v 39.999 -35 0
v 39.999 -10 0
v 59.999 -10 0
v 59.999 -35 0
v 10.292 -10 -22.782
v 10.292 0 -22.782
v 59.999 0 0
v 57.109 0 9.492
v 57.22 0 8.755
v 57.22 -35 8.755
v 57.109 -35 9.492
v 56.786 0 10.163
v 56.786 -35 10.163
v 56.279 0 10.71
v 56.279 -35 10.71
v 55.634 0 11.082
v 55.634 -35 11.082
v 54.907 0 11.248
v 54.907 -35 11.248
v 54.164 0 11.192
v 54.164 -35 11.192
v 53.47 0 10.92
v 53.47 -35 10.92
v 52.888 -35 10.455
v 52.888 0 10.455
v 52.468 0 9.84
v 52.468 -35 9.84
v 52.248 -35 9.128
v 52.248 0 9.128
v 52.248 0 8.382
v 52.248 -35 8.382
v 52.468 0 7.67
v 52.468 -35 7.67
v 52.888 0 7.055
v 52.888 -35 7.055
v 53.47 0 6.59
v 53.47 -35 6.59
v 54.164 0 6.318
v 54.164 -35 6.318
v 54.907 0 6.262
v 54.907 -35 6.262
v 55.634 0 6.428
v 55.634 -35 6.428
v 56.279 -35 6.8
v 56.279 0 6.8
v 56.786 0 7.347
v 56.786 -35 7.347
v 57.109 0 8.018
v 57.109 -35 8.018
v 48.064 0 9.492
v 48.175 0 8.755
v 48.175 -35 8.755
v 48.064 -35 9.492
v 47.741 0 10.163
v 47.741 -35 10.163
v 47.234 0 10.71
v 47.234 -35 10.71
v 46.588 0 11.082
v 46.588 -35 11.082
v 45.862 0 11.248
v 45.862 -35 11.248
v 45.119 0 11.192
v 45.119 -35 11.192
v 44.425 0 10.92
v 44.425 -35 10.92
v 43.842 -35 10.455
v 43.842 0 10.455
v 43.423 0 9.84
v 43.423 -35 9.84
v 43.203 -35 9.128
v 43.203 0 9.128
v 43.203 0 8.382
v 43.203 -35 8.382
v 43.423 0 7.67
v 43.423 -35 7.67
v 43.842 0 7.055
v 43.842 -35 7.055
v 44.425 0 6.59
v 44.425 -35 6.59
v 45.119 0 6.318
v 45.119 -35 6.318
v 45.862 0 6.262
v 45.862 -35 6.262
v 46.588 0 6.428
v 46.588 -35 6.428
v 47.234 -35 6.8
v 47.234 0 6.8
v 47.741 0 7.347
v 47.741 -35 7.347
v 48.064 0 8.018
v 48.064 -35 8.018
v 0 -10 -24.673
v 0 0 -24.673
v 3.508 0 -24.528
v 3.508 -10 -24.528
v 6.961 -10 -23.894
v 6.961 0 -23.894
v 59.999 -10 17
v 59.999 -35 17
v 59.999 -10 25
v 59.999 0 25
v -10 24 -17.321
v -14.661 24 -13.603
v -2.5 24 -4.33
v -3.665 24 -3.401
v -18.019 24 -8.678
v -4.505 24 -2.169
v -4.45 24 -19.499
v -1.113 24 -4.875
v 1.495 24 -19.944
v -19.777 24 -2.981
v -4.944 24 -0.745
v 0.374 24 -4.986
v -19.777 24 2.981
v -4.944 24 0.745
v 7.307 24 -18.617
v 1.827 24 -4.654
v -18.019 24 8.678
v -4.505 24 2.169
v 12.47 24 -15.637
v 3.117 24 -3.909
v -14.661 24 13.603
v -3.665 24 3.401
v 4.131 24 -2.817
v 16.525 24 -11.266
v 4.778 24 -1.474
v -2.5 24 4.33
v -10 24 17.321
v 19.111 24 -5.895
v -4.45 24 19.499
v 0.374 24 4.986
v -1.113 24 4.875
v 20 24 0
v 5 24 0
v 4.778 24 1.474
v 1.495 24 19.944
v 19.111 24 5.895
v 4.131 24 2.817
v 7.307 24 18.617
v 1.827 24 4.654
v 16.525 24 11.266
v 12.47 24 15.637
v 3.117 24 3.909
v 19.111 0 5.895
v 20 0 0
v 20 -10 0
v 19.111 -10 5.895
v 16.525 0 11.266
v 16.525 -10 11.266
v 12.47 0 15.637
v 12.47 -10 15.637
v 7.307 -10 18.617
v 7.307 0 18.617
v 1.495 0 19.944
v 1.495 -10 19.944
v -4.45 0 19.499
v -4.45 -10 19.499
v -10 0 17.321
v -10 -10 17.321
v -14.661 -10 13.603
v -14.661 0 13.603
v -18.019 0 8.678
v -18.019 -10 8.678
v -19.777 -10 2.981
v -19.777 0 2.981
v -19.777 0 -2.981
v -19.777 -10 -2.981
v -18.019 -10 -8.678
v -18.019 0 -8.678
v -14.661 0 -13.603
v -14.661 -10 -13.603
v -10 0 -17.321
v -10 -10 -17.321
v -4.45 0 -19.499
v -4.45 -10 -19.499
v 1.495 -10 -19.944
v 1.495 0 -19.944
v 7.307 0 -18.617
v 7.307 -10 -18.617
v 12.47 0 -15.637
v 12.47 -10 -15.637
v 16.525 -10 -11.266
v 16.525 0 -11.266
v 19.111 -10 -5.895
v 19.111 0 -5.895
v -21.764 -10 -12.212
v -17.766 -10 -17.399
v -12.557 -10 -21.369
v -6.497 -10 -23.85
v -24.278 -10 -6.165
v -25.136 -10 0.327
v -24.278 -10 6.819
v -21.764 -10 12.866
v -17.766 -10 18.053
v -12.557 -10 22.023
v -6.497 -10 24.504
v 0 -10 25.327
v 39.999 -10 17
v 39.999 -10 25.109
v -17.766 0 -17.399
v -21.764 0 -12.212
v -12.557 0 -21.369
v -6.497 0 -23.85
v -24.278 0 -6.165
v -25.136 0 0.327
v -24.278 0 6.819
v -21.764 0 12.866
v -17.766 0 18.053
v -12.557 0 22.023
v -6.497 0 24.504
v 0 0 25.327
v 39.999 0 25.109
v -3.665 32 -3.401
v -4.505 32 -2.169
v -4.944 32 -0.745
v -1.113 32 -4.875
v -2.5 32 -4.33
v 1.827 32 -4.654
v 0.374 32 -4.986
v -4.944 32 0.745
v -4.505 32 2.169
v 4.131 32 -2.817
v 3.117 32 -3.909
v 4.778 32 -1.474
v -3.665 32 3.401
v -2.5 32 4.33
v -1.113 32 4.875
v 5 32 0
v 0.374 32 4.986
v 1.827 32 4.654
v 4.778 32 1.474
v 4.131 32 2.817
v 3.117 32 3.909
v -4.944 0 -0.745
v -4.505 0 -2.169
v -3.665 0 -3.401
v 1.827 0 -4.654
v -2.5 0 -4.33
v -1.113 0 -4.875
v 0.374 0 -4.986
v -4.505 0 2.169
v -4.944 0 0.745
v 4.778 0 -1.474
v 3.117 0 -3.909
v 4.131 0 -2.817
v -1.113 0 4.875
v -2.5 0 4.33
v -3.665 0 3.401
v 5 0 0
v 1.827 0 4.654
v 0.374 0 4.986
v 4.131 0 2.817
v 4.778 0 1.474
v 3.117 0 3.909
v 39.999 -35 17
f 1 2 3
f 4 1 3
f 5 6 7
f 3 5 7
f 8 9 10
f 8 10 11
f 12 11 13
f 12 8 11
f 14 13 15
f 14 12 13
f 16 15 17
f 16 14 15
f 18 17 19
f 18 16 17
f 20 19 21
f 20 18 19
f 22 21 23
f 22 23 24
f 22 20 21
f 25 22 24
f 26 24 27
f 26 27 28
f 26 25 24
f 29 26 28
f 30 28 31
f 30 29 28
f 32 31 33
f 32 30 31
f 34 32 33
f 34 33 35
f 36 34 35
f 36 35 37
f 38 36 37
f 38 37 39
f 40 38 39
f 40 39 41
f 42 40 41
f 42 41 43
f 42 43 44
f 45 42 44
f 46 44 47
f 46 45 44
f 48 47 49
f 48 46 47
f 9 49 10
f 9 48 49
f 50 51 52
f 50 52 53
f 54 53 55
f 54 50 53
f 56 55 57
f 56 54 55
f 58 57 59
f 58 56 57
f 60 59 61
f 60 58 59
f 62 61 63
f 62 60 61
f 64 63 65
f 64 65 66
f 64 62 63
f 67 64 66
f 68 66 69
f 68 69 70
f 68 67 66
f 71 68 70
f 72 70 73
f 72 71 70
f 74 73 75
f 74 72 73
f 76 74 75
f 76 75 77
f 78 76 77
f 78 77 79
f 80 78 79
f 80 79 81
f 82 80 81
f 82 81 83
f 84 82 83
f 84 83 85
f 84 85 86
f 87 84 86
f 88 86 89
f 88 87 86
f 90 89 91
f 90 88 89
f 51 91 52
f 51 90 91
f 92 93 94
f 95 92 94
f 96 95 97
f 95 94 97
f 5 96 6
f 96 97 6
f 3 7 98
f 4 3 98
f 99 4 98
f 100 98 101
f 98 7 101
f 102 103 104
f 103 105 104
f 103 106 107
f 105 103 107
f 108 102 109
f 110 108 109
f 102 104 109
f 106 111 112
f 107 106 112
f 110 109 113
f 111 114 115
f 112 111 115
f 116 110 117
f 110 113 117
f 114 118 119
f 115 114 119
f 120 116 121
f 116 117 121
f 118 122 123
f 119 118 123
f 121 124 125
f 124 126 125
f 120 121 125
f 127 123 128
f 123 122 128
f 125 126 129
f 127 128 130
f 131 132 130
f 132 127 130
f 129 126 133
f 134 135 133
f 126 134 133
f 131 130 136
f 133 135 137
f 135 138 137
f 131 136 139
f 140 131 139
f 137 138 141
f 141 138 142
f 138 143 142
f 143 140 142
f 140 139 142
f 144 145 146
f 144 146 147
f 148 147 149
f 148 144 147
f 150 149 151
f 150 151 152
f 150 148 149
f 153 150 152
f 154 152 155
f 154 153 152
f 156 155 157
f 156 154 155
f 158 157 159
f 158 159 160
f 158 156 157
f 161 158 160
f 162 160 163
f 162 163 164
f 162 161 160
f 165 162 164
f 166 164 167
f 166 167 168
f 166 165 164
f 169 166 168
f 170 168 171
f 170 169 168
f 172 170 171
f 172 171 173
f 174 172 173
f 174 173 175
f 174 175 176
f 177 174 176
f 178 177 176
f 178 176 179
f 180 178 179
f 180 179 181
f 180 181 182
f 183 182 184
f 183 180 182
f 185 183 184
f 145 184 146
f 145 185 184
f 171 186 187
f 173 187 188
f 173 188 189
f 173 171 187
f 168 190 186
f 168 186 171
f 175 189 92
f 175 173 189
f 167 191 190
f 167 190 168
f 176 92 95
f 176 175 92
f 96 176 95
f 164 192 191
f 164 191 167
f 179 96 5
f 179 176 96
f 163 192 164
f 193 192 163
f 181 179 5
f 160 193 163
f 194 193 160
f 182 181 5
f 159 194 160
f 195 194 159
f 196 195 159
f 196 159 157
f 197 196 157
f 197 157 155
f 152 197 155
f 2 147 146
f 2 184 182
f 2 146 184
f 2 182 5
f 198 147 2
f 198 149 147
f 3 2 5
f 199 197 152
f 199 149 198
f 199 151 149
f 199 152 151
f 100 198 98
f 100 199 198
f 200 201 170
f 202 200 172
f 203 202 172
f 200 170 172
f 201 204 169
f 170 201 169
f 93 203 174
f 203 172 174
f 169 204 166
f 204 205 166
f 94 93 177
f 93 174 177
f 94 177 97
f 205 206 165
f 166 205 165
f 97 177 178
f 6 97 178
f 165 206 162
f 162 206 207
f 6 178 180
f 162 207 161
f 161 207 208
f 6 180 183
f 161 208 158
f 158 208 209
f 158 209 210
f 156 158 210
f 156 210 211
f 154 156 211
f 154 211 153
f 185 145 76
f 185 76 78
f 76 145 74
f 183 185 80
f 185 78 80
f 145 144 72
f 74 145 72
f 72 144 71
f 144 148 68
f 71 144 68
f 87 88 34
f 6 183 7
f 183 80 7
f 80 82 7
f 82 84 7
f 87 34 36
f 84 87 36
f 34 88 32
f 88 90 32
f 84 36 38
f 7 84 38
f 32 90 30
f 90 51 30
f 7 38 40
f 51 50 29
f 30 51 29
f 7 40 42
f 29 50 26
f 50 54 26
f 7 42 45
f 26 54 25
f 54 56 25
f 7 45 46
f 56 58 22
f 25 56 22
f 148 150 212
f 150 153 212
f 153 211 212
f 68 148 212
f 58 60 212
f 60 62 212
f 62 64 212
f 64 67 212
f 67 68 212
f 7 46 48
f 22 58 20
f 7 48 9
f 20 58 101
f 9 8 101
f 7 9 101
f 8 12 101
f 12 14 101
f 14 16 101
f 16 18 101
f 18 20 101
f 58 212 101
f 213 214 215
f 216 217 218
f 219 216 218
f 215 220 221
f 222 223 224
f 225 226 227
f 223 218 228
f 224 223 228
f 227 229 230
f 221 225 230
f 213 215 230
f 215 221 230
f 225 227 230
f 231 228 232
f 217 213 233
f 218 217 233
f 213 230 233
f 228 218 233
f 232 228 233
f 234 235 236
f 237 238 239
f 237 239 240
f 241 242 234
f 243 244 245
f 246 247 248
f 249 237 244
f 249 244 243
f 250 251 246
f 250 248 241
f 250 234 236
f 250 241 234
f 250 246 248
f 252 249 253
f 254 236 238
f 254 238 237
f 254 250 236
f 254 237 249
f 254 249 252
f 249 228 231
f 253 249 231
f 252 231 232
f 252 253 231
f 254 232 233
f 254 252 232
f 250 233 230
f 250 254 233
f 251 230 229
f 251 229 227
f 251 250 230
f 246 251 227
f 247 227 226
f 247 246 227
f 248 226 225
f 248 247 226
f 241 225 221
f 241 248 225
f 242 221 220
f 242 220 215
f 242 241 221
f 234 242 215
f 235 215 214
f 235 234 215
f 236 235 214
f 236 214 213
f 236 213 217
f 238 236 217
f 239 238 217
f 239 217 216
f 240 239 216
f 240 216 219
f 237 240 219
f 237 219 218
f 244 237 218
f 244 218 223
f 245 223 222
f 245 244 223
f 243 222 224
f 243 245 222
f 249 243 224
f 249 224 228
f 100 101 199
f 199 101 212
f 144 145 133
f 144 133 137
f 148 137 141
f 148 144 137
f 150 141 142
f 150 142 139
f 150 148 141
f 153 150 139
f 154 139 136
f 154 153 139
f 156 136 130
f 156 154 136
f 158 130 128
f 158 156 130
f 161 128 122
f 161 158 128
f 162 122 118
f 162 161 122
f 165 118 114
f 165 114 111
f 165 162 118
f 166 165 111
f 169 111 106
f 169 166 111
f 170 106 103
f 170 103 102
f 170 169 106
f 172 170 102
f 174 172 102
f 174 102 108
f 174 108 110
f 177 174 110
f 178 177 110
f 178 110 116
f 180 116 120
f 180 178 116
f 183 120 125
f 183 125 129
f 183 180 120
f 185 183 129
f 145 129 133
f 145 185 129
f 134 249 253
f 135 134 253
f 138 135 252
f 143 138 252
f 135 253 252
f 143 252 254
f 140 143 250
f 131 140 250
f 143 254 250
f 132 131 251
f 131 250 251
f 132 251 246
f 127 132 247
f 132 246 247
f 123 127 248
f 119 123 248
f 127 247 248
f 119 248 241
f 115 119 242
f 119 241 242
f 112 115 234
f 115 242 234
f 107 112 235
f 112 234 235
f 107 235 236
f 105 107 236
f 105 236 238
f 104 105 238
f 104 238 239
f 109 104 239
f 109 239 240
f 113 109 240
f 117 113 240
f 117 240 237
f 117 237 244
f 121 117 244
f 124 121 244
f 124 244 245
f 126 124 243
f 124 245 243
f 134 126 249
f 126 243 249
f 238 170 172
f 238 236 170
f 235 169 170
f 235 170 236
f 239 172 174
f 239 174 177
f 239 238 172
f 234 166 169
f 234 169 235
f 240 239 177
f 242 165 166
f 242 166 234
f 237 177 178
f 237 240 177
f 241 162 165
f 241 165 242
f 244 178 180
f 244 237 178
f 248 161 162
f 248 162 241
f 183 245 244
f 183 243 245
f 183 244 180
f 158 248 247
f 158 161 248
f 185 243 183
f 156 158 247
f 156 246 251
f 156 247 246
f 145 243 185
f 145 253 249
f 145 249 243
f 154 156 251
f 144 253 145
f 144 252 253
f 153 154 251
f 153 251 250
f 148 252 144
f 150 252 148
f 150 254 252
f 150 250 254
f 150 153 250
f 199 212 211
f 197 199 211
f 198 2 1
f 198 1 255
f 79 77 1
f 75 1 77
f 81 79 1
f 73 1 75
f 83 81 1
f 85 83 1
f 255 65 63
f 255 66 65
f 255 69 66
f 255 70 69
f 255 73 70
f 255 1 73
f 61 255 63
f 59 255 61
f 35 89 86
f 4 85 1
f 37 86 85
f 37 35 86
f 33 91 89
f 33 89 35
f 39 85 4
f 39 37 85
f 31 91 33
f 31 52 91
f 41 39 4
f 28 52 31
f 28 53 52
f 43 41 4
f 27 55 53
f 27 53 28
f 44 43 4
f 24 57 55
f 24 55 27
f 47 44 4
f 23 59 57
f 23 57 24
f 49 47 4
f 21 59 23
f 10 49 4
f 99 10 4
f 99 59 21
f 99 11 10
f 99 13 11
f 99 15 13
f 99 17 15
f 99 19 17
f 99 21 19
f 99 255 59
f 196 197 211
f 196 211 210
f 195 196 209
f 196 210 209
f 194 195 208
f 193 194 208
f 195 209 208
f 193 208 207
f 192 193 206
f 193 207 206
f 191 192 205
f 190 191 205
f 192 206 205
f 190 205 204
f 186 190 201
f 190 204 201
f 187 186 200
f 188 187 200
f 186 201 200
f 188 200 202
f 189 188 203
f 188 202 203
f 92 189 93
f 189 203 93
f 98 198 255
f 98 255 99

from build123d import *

# Parameters (mm, degrees)
F0_R     = 20
F0_R_2   = 5
F1_DEPTH = 24
F2_DEPTH = 10
F0_W     = 20
F0_H     = 17
F0_R_3   = 2.5
F3_DEPTH = 35
F4_DEPTH = 10
F5_DEPTH = 32


with BuildPart() as f1:
    # F0 (on Front) → F1 (new body)
    with BuildSketch(Plane.XZ):
        Circle(F0_R)
        Circle(F0_R_2, mode=Mode.SUBTRACT)
    extrude(amount=-F1_DEPTH)


with BuildPart() as f2:
    # F0 (on Front) → F2 (new body)
    with BuildSketch(Plane.XZ):
        with BuildLine():
            Line((39.999111, 25.108884), (0, 25.326648))
            ThreePointArc((0, 25.326648), (-25.136103, 0.327019), (0, -24.672611))
            ThreePointArc((0, -24.672611), (5.245914, -24.271862), (10.29189, -22.782449))
            Line((10.29189, -22.782449), (59.999111, 0))
            Line((59.999111, 0), (39.999111, 0))
            Line((39.999111, 0), (39.999111, 17))
            Line((39.999111, 17), (39.999111, 25.108884))
        make_face()
        Circle(F0_R, mode=Mode.SUBTRACT)
    extrude(amount=F2_DEPTH)

    # F0 (on Front) → F3 (join)
    with BuildSketch(Plane.XZ):
        with Locations((49.999111, 8.5)):
            Rectangle(F0_W, F0_H)
        with Locations((45.67508, 8.755062)):
            Circle(F0_R_3, mode=Mode.SUBTRACT)
        with Locations((54.72048, 8.755062)):
            Circle(F0_R_3, mode=Mode.SUBTRACT)
    extrude(amount=F3_DEPTH)

    # F0 (on Front) → F4 (join)
    with BuildSketch(Plane.XZ):
        Polygon((59.999111, 25), (39.999111, 25.108884), (39.999111, 17), (59.999111, 17), align=None)
    extrude(amount=F4_DEPTH)


with BuildPart() as f5:
    # F0 (on Front) → F5 (new body)
    with BuildSketch(Plane.XZ):
        Circle(F0_R_2)
    extrude(amount=-F5_DEPTH)


solid = Compound([f1.part, f2.part, f5.part])
